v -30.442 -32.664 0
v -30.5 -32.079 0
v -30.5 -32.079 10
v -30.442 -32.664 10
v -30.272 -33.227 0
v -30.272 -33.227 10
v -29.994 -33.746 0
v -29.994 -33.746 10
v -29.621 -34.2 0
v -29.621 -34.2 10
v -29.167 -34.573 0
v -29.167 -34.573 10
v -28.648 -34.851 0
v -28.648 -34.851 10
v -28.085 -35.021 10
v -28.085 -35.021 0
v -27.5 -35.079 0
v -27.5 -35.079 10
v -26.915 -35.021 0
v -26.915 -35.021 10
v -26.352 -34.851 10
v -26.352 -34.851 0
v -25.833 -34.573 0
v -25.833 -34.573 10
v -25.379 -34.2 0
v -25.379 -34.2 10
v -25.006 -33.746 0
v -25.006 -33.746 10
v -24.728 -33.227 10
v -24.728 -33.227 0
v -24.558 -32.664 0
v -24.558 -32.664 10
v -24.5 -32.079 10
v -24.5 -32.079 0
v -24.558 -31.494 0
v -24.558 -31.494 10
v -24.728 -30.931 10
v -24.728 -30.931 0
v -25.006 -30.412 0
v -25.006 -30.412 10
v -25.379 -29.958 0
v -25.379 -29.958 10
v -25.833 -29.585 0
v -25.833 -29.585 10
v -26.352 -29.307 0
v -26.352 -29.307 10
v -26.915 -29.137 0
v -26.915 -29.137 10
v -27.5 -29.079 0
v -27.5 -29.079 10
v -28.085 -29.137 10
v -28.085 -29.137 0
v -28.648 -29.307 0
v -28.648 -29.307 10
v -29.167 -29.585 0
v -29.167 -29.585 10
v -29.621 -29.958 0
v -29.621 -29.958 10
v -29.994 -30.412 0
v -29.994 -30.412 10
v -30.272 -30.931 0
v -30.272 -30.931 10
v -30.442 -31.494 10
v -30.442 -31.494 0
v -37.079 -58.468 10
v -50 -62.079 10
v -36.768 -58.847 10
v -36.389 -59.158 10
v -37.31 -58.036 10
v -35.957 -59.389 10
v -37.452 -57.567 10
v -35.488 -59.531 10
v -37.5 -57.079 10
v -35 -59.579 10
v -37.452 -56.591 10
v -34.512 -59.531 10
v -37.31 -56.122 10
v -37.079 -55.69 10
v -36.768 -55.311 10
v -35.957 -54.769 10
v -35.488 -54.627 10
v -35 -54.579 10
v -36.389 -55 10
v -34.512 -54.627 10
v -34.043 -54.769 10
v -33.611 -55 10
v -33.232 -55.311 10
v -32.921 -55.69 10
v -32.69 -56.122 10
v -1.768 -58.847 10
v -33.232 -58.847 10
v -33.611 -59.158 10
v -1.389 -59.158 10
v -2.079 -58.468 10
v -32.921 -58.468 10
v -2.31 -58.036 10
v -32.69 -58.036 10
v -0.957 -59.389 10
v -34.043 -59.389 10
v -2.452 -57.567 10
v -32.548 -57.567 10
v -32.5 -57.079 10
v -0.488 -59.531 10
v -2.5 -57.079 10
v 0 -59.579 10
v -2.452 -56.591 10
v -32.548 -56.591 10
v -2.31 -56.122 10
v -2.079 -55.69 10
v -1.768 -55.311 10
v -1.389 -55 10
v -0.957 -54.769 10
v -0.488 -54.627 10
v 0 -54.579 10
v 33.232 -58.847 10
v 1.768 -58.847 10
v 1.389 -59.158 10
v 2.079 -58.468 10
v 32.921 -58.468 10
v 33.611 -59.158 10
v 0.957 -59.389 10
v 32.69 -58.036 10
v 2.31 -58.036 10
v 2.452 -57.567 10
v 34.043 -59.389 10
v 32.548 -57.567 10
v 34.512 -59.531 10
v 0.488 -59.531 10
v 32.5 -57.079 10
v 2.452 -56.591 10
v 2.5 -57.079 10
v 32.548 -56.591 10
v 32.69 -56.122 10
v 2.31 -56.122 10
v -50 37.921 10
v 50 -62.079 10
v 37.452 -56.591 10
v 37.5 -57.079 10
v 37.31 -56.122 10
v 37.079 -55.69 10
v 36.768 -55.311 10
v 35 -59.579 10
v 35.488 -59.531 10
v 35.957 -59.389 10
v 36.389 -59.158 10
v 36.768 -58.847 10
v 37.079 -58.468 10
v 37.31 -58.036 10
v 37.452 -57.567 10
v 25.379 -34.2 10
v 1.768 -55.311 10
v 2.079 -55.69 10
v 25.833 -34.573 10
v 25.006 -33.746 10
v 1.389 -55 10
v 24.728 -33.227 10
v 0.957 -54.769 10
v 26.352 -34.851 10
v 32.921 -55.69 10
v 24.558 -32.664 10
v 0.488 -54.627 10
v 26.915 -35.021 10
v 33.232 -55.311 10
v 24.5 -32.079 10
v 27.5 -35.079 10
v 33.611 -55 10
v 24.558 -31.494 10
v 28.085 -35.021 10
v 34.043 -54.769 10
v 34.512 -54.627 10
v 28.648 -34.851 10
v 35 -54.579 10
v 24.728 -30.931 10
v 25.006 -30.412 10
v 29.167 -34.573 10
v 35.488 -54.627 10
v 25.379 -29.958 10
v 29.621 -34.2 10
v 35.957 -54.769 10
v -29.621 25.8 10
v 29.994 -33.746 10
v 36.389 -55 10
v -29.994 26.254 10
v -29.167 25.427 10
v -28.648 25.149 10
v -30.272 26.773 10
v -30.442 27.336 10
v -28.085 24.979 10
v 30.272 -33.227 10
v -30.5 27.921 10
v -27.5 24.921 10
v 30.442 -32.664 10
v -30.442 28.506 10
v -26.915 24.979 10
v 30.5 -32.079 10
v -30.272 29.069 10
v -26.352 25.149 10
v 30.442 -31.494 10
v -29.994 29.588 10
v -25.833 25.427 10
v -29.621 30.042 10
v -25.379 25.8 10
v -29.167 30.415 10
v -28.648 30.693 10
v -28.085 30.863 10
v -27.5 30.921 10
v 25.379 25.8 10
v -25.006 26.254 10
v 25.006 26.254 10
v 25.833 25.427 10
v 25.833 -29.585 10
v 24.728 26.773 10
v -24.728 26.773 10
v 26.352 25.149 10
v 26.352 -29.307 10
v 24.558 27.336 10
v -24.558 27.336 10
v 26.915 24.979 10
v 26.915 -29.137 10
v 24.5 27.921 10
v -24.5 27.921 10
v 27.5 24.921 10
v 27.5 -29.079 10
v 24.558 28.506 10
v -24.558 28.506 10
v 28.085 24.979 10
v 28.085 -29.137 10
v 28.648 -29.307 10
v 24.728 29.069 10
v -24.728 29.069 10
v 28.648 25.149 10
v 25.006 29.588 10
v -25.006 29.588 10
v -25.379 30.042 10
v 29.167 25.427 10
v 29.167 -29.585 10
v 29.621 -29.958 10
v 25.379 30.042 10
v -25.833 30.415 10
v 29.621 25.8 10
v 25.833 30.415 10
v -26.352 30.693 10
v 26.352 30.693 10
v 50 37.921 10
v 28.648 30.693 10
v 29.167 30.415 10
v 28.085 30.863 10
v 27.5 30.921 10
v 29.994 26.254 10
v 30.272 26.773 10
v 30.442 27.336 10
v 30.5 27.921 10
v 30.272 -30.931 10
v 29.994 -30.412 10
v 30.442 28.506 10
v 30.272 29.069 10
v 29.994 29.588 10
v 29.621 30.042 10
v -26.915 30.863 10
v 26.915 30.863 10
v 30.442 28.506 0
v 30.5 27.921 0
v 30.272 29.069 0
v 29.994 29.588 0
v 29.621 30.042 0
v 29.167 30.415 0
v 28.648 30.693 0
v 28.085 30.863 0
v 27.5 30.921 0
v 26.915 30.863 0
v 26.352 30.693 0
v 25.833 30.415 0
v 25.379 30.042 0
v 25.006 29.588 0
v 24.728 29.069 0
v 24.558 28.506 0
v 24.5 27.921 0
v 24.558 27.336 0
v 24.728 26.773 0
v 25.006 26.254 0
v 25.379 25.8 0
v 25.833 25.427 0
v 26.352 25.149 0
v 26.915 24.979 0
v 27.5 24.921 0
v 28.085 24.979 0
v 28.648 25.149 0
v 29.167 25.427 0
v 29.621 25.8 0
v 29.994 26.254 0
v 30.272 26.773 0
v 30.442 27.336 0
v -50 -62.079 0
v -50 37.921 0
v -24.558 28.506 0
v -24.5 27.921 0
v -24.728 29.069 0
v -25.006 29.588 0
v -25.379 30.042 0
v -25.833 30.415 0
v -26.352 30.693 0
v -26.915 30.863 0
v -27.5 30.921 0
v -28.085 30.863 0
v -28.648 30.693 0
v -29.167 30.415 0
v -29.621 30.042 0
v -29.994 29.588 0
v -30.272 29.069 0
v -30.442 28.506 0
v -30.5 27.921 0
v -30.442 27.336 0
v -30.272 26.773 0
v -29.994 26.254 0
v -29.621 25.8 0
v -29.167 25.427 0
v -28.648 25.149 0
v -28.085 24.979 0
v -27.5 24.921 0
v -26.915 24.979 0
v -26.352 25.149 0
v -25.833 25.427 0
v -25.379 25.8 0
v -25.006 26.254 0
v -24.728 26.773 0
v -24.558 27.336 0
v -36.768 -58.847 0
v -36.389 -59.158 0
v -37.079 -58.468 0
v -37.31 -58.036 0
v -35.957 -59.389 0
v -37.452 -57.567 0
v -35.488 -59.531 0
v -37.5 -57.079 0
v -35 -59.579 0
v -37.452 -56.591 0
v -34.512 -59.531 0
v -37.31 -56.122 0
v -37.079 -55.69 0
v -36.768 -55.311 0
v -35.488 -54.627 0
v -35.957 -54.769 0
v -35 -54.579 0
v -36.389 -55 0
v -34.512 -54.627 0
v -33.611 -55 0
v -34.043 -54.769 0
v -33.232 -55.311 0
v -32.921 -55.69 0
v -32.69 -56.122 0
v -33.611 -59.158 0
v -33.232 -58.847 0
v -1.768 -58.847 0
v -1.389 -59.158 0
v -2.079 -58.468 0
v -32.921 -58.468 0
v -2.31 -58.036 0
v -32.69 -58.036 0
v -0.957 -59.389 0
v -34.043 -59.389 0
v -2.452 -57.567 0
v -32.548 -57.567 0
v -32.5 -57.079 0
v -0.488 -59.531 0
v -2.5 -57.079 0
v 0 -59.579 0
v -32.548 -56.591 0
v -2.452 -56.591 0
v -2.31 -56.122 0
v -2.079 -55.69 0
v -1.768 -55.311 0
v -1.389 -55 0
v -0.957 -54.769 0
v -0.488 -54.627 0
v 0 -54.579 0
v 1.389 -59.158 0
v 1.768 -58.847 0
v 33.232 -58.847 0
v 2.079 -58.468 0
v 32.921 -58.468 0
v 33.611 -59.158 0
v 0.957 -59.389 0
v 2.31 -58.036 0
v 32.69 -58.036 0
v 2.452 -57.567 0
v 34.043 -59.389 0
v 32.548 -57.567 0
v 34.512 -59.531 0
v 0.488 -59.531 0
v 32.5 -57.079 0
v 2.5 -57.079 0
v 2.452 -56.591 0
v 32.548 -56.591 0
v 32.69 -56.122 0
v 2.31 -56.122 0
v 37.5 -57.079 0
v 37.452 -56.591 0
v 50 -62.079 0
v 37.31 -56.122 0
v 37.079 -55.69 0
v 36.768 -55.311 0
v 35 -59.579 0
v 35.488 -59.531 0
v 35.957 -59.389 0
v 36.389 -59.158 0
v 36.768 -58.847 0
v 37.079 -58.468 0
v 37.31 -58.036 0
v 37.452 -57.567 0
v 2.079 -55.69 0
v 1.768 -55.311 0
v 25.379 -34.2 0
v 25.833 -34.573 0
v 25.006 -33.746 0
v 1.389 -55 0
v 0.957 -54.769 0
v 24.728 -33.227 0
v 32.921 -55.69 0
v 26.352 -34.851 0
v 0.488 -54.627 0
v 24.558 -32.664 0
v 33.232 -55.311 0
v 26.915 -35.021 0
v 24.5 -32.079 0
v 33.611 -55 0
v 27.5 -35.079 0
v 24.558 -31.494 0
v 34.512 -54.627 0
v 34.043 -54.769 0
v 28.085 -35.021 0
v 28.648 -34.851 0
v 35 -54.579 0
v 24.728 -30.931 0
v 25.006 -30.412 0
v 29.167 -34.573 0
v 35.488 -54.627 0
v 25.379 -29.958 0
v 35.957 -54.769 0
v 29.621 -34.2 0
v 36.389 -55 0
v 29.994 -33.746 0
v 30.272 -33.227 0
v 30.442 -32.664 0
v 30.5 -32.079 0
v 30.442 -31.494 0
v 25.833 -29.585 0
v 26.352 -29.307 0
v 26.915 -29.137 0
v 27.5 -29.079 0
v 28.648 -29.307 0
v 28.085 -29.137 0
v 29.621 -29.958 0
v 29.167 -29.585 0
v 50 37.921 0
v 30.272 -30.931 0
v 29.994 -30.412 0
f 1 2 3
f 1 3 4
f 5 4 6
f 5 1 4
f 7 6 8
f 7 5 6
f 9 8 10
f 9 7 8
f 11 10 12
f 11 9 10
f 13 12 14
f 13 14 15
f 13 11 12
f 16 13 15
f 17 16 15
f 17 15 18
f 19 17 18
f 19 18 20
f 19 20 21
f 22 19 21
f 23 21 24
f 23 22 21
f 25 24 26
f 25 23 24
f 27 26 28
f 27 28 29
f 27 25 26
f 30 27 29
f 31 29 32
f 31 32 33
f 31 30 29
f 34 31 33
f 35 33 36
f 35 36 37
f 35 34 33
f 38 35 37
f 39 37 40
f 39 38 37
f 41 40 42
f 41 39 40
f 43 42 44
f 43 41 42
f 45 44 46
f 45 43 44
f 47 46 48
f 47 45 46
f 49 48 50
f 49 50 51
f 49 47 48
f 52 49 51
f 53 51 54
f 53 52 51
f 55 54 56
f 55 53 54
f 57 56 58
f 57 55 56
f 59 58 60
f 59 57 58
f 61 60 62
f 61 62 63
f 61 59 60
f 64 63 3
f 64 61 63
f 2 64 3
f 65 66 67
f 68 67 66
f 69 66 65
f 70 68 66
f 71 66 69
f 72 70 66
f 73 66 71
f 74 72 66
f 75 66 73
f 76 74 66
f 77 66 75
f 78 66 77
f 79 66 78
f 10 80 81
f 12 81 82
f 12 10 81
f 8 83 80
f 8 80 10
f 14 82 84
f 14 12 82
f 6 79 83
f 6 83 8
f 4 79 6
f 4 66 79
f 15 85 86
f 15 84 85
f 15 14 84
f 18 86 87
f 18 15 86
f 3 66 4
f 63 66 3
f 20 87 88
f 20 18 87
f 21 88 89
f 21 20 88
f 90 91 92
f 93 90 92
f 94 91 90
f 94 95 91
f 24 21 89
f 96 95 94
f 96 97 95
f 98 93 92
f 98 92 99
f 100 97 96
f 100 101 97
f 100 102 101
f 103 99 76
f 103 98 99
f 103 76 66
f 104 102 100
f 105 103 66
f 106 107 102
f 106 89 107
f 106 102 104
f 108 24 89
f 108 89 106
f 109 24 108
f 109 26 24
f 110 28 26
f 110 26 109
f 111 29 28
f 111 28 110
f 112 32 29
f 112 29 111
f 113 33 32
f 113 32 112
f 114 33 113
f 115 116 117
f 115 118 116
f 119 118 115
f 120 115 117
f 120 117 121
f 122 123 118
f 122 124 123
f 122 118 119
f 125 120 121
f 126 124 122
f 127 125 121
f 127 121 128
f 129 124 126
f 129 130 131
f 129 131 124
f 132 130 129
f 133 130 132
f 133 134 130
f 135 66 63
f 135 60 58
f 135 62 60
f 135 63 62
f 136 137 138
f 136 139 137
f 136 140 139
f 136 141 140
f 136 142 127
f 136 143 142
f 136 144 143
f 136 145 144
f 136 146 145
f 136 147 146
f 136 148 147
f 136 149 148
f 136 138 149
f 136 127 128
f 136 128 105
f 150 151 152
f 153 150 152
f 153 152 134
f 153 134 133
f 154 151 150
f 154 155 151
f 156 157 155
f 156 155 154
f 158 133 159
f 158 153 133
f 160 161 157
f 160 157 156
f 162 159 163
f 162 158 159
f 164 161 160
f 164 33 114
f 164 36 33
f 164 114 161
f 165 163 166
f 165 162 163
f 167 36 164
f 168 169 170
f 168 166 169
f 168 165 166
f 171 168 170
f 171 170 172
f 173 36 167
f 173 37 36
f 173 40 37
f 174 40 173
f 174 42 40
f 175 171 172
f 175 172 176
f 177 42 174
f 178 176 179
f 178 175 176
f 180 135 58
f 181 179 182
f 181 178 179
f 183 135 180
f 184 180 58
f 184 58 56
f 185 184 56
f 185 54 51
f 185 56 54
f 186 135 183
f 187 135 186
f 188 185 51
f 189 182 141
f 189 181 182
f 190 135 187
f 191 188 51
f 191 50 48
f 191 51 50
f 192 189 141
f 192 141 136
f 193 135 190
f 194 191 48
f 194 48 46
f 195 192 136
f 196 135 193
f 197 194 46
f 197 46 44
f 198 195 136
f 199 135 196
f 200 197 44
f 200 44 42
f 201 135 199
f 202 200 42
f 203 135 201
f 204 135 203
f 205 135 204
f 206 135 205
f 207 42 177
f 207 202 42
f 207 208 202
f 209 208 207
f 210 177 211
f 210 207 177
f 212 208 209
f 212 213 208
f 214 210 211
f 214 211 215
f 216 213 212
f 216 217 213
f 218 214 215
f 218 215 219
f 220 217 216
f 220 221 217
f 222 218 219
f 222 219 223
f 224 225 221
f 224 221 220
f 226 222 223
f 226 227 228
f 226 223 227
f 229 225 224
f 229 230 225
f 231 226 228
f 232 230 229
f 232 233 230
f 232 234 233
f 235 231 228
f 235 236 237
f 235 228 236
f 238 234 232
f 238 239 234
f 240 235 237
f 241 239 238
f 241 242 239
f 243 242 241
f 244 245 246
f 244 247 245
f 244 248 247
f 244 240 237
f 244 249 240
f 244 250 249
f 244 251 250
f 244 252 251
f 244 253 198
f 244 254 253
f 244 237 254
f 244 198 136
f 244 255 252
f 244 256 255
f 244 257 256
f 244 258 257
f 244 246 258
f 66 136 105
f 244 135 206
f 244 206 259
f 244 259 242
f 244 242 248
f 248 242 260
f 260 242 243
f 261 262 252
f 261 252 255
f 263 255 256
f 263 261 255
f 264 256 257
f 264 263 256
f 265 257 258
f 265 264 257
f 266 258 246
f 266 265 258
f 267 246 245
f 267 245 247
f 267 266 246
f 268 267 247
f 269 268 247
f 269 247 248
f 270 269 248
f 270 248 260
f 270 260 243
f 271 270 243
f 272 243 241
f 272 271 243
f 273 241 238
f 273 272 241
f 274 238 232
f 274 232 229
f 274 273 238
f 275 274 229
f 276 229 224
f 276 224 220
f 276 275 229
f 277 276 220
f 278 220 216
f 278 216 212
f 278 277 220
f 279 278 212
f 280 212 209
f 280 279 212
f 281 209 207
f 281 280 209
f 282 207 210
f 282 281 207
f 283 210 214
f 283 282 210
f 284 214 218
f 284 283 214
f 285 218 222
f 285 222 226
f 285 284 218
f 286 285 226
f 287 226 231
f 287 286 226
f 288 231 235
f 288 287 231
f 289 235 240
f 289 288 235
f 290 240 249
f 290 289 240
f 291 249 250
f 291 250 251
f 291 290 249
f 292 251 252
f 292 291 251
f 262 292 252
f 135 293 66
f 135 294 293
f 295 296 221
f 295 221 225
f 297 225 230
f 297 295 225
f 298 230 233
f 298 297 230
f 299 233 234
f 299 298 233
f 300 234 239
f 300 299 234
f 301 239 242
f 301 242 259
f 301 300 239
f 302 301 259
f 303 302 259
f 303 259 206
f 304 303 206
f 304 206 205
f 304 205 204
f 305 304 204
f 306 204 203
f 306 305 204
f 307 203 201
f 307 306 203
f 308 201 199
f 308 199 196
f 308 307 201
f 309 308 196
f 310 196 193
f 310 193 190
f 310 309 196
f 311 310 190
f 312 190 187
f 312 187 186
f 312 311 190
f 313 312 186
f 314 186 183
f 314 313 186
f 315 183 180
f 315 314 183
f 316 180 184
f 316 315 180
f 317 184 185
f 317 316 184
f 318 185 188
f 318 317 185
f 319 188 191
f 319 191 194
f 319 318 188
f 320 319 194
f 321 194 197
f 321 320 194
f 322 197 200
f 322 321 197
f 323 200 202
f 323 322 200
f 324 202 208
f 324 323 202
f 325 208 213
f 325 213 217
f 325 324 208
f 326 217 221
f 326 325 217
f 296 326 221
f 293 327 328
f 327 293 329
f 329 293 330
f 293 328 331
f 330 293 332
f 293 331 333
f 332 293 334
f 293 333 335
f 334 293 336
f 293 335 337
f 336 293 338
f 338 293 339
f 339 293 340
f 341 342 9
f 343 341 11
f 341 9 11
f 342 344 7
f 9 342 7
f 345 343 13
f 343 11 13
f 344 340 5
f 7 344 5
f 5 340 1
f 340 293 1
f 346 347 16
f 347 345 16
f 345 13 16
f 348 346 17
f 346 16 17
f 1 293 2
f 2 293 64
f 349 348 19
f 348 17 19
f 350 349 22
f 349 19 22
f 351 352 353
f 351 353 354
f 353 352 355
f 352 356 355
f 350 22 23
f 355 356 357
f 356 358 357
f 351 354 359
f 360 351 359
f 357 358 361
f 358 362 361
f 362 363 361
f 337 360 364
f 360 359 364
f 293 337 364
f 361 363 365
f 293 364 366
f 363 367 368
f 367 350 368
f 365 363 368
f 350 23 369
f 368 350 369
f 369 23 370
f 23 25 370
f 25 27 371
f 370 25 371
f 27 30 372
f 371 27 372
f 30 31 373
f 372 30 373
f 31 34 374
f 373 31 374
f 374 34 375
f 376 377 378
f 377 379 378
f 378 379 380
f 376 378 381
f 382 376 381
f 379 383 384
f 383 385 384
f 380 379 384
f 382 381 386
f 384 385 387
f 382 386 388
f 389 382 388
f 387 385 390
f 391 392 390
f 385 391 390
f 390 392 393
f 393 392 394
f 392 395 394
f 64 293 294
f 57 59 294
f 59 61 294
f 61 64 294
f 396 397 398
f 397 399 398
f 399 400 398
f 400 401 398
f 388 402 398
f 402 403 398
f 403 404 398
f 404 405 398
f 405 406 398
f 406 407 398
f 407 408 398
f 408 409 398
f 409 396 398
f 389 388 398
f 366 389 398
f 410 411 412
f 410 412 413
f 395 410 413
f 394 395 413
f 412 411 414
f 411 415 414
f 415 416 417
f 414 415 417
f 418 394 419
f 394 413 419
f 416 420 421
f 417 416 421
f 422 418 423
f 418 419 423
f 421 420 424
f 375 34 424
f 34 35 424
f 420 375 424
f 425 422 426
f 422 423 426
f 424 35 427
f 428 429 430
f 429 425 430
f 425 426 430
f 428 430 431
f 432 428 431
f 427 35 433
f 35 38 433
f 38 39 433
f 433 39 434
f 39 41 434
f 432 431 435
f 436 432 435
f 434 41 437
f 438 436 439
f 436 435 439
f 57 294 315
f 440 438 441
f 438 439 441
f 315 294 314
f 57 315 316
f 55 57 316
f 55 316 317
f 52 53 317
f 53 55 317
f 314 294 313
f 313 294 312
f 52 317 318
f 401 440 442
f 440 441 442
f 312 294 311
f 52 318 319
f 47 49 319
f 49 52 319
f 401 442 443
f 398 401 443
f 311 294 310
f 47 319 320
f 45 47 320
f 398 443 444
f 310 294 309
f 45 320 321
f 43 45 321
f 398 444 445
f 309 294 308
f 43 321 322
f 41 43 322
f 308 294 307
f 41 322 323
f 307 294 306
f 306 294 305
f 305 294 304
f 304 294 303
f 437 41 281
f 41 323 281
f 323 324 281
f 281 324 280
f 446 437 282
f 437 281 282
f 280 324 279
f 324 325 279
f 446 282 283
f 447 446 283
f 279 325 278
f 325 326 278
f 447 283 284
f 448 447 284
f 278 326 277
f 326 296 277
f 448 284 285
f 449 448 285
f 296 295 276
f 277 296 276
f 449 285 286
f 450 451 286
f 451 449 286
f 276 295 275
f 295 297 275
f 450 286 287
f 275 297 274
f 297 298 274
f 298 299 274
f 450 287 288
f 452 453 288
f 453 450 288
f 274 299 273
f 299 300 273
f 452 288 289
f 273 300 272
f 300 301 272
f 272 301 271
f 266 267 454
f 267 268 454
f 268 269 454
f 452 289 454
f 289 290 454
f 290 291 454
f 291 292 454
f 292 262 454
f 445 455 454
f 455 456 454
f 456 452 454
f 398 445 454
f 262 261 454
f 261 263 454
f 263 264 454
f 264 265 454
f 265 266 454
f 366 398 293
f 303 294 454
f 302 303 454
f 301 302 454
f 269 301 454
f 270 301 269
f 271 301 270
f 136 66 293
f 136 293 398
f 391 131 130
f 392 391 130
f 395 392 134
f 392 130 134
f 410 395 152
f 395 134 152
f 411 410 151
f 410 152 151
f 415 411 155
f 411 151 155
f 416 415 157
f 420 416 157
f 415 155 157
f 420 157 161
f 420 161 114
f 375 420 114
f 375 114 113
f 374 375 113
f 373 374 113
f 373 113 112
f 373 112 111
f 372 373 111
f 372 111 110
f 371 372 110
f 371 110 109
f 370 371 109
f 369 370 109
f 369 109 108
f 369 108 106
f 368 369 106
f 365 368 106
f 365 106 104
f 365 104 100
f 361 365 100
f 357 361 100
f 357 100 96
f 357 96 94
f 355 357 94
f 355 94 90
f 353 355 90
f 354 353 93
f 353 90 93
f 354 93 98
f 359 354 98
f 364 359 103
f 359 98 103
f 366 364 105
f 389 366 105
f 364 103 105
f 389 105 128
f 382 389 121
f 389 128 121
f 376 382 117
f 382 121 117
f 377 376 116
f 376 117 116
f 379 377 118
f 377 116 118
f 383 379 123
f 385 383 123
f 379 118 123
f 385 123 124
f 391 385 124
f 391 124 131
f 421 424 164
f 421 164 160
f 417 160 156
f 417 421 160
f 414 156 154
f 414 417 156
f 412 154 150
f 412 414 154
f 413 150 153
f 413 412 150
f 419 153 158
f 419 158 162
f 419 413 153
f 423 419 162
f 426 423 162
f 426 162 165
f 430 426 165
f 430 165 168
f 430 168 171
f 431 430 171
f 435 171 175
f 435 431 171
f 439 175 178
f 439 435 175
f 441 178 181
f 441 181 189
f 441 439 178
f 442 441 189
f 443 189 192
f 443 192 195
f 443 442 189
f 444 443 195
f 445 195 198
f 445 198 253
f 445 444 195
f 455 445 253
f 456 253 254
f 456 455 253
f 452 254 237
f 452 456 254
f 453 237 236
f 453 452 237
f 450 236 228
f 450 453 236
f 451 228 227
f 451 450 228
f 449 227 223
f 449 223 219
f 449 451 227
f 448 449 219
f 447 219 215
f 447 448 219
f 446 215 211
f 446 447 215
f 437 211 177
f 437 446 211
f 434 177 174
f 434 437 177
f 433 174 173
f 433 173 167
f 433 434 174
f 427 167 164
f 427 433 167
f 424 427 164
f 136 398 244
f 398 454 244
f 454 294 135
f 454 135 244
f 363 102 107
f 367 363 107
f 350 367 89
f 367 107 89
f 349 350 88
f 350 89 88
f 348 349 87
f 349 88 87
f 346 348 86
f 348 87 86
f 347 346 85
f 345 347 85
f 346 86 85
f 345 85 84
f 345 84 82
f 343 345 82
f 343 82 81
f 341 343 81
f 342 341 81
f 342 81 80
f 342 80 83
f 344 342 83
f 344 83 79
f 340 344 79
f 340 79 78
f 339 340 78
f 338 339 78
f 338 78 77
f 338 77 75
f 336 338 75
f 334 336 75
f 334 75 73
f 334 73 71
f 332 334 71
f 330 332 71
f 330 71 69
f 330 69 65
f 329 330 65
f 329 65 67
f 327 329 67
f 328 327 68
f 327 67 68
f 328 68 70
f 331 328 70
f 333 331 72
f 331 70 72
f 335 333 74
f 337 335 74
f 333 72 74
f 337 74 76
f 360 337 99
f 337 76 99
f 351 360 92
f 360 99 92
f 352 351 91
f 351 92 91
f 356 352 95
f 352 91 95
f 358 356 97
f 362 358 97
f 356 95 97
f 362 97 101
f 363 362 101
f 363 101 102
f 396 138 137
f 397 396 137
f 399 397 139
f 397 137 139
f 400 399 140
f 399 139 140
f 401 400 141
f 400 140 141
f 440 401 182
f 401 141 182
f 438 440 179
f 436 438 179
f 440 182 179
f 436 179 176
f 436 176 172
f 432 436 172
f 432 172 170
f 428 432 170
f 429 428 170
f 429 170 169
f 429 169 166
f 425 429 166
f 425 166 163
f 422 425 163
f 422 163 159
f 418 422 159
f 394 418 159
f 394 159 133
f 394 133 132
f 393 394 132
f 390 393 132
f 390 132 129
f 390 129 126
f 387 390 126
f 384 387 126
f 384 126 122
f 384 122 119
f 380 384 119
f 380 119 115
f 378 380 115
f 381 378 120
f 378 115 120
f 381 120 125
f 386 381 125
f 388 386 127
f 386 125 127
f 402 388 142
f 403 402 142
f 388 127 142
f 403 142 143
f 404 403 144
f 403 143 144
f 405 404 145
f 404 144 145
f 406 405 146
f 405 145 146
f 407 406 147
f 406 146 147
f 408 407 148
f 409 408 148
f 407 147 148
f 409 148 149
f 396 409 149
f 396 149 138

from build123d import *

# Parameters (mm, degrees)
SKETCH2_W           = 100
SKETCH2_H           = 80
SKETCH2_R           = 3
BOSS_EXTRUDE1_DEPTH = 10
SKETCH3_W           = 100
SKETCH3_H           = 10
BOSS_EXTRUDE2_DEPTH = 20
CUT_EXTRUDE1_REACH  = 82.336
SKETCH4_R           = 2.5


with BuildPart() as part:
    # Sketch2 → Boss-Extrude1 (new body)
    with BuildSketch(Plane.XY):
        with Locations((0, -2.079062729)):
            Rectangle(SKETCH2_W, SKETCH2_H)
        with Locations((27.5, 27.920937271)):
            Circle(SKETCH2_R, mode=Mode.SUBTRACT)
        with Locations((-27.5, 27.920937271)):
            Circle(SKETCH2_R, mode=Mode.SUBTRACT)
        with Locations(Location((-27.5, -32.079062729, 0), (0, 0, 180))):
            Circle(SKETCH2_R, mode=Mode.SUBTRACT)
        with Locations(Location((27.5, -32.079062729, 0), (0, 0, 180))):
            Circle(SKETCH2_R, mode=Mode.SUBTRACT)
    extrude(amount=BOSS_EXTRUDE1_DEPTH)

    # Sketch3 → Boss-Extrude2 (add)
    with BuildSketch(Plane.XZ.offset(42.079062729)):
        with Locations((0, 5)):
            Rectangle(SKETCH3_W, SKETCH3_H)
    extrude(amount=BOSS_EXTRUDE2_DEPTH)

    # Sketch4 → Cut-Extrude1 (cut, up to next)
    with BuildSketch(Plane.XY.offset(10), mode=Mode.PRIVATE) as cut_extrude1_sk1:
        with Locations((0, -57.079062729)):
            Circle(SKETCH4_R)
    cut_extrude1_tool1 = extrude(cut_extrude1_sk1.sketch, amount=-CUT_EXTRUDE1_REACH, mode=Mode.PRIVATE) & part.part
    # Sketch4 → Cut-Extrude1 (cut, up to next)
    with BuildSketch(Plane.XY.offset(10), mode=Mode.PRIVATE) as cut_extrude1_sk2:
        with Locations((-35, -57.079062729)):
            Circle(SKETCH4_R)
    cut_extrude1_tool2 = extrude(cut_extrude1_sk2.sketch, amount=-CUT_EXTRUDE1_REACH, mode=Mode.PRIVATE) & part.part
    # Sketch4 → Cut-Extrude1 (cut, up to next)
    with BuildSketch(Plane.XY.offset(10), mode=Mode.PRIVATE) as cut_extrude1_sk3:
        with Locations((35, -57.079062729)):
            Circle(SKETCH4_R)
    cut_extrude1_tool3 = extrude(cut_extrude1_sk3.sketch, amount=-CUT_EXTRUDE1_REACH, mode=Mode.PRIVATE) & part.part
    add(cut_extrude1_tool1.solids().sort_by_distance((0, -57.079063, 10))[0], mode=Mode.SUBTRACT)
    add(cut_extrude1_tool2.solids().sort_by_distance((-35, -57.079063, 10))[0], mode=Mode.SUBTRACT)
    add(cut_extrude1_tool3.solids().sort_by_distance((35, -57.079063, 10))[0], mode=Mode.SUBTRACT)


solid = part.part
